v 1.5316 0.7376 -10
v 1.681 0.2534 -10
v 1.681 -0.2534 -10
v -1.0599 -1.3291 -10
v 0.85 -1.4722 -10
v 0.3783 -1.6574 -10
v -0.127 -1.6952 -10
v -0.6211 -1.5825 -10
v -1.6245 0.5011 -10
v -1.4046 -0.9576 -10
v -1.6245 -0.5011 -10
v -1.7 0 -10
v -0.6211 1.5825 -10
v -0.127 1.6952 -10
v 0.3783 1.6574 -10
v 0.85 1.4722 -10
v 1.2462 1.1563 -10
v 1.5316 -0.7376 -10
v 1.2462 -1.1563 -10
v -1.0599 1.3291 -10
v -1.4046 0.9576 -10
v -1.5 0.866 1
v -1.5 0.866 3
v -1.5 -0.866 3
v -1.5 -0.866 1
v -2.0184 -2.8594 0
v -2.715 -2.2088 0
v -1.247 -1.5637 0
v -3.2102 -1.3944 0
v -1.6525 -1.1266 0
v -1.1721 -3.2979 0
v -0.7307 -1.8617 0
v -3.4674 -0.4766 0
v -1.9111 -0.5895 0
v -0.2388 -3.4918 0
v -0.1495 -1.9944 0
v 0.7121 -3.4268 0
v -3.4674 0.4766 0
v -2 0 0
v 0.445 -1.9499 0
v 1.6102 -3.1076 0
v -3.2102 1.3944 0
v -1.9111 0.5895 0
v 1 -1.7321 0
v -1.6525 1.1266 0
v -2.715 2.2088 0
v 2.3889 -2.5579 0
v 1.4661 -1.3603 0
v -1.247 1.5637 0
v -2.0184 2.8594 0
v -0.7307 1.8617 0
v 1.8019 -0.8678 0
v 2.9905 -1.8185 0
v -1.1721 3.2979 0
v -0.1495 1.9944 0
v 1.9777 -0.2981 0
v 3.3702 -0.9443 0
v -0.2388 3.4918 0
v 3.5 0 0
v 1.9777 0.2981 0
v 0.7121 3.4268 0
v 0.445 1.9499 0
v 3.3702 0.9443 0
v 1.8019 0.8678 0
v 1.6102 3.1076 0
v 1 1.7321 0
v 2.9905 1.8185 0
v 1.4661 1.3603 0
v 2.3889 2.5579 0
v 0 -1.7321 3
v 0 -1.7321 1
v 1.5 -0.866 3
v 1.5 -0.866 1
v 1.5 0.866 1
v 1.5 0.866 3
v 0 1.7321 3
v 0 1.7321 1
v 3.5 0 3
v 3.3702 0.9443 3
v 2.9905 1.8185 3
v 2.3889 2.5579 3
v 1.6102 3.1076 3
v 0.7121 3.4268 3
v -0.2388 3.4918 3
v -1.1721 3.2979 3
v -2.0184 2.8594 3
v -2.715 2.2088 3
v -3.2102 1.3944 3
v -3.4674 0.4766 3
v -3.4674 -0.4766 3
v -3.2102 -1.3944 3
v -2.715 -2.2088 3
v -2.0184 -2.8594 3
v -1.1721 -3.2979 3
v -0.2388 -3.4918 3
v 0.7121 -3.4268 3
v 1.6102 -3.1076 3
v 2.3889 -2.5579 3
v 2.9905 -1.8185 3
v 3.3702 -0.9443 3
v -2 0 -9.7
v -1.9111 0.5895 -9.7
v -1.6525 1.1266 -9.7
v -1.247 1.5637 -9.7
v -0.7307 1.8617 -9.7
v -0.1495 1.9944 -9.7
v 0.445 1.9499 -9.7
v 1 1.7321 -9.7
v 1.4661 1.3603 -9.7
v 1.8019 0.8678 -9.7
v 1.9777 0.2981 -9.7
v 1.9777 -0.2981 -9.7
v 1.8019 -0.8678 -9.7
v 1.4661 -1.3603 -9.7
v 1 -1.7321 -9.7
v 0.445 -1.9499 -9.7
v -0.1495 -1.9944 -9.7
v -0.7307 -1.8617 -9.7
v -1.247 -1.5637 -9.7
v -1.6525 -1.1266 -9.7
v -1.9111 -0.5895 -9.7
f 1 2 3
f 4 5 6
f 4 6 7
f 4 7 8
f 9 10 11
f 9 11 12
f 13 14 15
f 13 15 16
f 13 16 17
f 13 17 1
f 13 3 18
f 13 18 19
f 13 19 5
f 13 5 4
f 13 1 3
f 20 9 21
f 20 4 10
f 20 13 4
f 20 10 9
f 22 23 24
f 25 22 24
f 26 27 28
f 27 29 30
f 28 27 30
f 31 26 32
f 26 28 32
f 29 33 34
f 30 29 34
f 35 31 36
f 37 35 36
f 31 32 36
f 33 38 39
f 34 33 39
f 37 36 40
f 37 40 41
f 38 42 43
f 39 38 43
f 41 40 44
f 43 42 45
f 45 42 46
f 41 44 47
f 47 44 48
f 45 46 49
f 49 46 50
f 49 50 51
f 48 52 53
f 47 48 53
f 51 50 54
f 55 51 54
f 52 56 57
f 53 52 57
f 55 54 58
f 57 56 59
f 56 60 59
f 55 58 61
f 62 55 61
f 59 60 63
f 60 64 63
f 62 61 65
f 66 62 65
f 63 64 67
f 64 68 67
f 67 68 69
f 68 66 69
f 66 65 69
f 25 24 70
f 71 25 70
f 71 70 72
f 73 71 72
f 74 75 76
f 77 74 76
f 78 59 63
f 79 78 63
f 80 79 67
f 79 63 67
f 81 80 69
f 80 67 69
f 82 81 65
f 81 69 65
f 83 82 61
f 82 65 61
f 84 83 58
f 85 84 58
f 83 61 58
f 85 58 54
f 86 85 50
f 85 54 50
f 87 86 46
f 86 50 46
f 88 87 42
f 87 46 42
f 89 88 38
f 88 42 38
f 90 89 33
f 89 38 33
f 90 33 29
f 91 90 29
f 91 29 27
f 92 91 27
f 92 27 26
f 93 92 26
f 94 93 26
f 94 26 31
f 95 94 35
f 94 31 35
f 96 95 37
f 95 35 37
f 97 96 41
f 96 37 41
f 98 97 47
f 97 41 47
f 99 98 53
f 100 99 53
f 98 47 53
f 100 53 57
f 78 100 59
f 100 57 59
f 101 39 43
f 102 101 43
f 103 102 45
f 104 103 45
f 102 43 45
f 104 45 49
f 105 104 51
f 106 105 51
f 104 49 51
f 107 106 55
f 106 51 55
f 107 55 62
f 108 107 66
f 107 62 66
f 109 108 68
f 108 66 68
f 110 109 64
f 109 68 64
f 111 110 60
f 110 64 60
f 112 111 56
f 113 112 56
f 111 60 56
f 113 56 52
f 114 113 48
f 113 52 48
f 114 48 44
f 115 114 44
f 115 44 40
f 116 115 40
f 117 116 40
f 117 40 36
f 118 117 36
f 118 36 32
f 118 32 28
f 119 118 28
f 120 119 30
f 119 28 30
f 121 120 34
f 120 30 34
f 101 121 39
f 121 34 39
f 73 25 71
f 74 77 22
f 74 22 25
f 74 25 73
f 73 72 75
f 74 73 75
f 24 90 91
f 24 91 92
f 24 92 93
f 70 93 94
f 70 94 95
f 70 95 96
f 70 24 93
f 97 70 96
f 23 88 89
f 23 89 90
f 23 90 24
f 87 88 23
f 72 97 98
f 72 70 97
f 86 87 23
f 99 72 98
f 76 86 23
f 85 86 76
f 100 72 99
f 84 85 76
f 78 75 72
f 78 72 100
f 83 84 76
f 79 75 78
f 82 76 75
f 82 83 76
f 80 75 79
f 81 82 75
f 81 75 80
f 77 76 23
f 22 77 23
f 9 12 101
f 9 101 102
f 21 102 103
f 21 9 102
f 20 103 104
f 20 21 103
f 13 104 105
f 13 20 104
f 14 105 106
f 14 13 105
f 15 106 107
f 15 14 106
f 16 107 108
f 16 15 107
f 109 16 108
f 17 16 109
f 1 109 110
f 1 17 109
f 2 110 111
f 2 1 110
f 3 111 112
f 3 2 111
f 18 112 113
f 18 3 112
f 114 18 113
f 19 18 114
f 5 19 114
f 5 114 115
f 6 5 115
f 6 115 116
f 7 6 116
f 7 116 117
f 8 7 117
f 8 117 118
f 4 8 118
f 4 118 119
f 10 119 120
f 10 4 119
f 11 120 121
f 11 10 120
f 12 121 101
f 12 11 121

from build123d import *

# Parameters (mm, degrees)
SKETCH1_R           = 3.5
BOSS_EXTRUDE1_DEPTH = 3
SKETCH2_R           = 2
BOSS_EXTRUDE2_DEPTH = 10
CHAMFER1_SIZE       = 0.3
CUT_EXTRUDE1_DEPTH  = 2


with BuildPart() as part:
    # Sketch1 → Boss-Extrude1 (new body)
    with BuildSketch(Plane.XY):
        Circle(SKETCH1_R)
    extrude(amount=BOSS_EXTRUDE1_DEPTH)

    # Sketch2 → Boss-Extrude2 (add)
    with BuildSketch(Plane(origin=(0, 0, 0), x_dir=(-1, 0, 0), z_dir=(0, 0, -1))):
        Circle(SKETCH2_R)
    extrude(amount=BOSS_EXTRUDE2_DEPTH)

    # Chamfer1
    chamfer1_edges = [part.edges().sort_by_distance(p)[0] for p in [
        (2, 0, -10),
    ]]
    chamfer(chamfer1_edges, length=CHAMFER1_SIZE)

    # Sketch3 → Cut-Extrude1 (cut)
    with BuildSketch(Plane.XY.offset(3)):
        Polygon((0, 1.732050808), (-1.5, 0.866025404), (-1.5, -0.866025404), (0, -1.732050808), (1.5, -0.866025404), (1.5, 0.866025404), align=None)
    extrude(amount=-CUT_EXTRUDE1_DEPTH, mode=Mode.SUBTRACT)


solid = part.part
